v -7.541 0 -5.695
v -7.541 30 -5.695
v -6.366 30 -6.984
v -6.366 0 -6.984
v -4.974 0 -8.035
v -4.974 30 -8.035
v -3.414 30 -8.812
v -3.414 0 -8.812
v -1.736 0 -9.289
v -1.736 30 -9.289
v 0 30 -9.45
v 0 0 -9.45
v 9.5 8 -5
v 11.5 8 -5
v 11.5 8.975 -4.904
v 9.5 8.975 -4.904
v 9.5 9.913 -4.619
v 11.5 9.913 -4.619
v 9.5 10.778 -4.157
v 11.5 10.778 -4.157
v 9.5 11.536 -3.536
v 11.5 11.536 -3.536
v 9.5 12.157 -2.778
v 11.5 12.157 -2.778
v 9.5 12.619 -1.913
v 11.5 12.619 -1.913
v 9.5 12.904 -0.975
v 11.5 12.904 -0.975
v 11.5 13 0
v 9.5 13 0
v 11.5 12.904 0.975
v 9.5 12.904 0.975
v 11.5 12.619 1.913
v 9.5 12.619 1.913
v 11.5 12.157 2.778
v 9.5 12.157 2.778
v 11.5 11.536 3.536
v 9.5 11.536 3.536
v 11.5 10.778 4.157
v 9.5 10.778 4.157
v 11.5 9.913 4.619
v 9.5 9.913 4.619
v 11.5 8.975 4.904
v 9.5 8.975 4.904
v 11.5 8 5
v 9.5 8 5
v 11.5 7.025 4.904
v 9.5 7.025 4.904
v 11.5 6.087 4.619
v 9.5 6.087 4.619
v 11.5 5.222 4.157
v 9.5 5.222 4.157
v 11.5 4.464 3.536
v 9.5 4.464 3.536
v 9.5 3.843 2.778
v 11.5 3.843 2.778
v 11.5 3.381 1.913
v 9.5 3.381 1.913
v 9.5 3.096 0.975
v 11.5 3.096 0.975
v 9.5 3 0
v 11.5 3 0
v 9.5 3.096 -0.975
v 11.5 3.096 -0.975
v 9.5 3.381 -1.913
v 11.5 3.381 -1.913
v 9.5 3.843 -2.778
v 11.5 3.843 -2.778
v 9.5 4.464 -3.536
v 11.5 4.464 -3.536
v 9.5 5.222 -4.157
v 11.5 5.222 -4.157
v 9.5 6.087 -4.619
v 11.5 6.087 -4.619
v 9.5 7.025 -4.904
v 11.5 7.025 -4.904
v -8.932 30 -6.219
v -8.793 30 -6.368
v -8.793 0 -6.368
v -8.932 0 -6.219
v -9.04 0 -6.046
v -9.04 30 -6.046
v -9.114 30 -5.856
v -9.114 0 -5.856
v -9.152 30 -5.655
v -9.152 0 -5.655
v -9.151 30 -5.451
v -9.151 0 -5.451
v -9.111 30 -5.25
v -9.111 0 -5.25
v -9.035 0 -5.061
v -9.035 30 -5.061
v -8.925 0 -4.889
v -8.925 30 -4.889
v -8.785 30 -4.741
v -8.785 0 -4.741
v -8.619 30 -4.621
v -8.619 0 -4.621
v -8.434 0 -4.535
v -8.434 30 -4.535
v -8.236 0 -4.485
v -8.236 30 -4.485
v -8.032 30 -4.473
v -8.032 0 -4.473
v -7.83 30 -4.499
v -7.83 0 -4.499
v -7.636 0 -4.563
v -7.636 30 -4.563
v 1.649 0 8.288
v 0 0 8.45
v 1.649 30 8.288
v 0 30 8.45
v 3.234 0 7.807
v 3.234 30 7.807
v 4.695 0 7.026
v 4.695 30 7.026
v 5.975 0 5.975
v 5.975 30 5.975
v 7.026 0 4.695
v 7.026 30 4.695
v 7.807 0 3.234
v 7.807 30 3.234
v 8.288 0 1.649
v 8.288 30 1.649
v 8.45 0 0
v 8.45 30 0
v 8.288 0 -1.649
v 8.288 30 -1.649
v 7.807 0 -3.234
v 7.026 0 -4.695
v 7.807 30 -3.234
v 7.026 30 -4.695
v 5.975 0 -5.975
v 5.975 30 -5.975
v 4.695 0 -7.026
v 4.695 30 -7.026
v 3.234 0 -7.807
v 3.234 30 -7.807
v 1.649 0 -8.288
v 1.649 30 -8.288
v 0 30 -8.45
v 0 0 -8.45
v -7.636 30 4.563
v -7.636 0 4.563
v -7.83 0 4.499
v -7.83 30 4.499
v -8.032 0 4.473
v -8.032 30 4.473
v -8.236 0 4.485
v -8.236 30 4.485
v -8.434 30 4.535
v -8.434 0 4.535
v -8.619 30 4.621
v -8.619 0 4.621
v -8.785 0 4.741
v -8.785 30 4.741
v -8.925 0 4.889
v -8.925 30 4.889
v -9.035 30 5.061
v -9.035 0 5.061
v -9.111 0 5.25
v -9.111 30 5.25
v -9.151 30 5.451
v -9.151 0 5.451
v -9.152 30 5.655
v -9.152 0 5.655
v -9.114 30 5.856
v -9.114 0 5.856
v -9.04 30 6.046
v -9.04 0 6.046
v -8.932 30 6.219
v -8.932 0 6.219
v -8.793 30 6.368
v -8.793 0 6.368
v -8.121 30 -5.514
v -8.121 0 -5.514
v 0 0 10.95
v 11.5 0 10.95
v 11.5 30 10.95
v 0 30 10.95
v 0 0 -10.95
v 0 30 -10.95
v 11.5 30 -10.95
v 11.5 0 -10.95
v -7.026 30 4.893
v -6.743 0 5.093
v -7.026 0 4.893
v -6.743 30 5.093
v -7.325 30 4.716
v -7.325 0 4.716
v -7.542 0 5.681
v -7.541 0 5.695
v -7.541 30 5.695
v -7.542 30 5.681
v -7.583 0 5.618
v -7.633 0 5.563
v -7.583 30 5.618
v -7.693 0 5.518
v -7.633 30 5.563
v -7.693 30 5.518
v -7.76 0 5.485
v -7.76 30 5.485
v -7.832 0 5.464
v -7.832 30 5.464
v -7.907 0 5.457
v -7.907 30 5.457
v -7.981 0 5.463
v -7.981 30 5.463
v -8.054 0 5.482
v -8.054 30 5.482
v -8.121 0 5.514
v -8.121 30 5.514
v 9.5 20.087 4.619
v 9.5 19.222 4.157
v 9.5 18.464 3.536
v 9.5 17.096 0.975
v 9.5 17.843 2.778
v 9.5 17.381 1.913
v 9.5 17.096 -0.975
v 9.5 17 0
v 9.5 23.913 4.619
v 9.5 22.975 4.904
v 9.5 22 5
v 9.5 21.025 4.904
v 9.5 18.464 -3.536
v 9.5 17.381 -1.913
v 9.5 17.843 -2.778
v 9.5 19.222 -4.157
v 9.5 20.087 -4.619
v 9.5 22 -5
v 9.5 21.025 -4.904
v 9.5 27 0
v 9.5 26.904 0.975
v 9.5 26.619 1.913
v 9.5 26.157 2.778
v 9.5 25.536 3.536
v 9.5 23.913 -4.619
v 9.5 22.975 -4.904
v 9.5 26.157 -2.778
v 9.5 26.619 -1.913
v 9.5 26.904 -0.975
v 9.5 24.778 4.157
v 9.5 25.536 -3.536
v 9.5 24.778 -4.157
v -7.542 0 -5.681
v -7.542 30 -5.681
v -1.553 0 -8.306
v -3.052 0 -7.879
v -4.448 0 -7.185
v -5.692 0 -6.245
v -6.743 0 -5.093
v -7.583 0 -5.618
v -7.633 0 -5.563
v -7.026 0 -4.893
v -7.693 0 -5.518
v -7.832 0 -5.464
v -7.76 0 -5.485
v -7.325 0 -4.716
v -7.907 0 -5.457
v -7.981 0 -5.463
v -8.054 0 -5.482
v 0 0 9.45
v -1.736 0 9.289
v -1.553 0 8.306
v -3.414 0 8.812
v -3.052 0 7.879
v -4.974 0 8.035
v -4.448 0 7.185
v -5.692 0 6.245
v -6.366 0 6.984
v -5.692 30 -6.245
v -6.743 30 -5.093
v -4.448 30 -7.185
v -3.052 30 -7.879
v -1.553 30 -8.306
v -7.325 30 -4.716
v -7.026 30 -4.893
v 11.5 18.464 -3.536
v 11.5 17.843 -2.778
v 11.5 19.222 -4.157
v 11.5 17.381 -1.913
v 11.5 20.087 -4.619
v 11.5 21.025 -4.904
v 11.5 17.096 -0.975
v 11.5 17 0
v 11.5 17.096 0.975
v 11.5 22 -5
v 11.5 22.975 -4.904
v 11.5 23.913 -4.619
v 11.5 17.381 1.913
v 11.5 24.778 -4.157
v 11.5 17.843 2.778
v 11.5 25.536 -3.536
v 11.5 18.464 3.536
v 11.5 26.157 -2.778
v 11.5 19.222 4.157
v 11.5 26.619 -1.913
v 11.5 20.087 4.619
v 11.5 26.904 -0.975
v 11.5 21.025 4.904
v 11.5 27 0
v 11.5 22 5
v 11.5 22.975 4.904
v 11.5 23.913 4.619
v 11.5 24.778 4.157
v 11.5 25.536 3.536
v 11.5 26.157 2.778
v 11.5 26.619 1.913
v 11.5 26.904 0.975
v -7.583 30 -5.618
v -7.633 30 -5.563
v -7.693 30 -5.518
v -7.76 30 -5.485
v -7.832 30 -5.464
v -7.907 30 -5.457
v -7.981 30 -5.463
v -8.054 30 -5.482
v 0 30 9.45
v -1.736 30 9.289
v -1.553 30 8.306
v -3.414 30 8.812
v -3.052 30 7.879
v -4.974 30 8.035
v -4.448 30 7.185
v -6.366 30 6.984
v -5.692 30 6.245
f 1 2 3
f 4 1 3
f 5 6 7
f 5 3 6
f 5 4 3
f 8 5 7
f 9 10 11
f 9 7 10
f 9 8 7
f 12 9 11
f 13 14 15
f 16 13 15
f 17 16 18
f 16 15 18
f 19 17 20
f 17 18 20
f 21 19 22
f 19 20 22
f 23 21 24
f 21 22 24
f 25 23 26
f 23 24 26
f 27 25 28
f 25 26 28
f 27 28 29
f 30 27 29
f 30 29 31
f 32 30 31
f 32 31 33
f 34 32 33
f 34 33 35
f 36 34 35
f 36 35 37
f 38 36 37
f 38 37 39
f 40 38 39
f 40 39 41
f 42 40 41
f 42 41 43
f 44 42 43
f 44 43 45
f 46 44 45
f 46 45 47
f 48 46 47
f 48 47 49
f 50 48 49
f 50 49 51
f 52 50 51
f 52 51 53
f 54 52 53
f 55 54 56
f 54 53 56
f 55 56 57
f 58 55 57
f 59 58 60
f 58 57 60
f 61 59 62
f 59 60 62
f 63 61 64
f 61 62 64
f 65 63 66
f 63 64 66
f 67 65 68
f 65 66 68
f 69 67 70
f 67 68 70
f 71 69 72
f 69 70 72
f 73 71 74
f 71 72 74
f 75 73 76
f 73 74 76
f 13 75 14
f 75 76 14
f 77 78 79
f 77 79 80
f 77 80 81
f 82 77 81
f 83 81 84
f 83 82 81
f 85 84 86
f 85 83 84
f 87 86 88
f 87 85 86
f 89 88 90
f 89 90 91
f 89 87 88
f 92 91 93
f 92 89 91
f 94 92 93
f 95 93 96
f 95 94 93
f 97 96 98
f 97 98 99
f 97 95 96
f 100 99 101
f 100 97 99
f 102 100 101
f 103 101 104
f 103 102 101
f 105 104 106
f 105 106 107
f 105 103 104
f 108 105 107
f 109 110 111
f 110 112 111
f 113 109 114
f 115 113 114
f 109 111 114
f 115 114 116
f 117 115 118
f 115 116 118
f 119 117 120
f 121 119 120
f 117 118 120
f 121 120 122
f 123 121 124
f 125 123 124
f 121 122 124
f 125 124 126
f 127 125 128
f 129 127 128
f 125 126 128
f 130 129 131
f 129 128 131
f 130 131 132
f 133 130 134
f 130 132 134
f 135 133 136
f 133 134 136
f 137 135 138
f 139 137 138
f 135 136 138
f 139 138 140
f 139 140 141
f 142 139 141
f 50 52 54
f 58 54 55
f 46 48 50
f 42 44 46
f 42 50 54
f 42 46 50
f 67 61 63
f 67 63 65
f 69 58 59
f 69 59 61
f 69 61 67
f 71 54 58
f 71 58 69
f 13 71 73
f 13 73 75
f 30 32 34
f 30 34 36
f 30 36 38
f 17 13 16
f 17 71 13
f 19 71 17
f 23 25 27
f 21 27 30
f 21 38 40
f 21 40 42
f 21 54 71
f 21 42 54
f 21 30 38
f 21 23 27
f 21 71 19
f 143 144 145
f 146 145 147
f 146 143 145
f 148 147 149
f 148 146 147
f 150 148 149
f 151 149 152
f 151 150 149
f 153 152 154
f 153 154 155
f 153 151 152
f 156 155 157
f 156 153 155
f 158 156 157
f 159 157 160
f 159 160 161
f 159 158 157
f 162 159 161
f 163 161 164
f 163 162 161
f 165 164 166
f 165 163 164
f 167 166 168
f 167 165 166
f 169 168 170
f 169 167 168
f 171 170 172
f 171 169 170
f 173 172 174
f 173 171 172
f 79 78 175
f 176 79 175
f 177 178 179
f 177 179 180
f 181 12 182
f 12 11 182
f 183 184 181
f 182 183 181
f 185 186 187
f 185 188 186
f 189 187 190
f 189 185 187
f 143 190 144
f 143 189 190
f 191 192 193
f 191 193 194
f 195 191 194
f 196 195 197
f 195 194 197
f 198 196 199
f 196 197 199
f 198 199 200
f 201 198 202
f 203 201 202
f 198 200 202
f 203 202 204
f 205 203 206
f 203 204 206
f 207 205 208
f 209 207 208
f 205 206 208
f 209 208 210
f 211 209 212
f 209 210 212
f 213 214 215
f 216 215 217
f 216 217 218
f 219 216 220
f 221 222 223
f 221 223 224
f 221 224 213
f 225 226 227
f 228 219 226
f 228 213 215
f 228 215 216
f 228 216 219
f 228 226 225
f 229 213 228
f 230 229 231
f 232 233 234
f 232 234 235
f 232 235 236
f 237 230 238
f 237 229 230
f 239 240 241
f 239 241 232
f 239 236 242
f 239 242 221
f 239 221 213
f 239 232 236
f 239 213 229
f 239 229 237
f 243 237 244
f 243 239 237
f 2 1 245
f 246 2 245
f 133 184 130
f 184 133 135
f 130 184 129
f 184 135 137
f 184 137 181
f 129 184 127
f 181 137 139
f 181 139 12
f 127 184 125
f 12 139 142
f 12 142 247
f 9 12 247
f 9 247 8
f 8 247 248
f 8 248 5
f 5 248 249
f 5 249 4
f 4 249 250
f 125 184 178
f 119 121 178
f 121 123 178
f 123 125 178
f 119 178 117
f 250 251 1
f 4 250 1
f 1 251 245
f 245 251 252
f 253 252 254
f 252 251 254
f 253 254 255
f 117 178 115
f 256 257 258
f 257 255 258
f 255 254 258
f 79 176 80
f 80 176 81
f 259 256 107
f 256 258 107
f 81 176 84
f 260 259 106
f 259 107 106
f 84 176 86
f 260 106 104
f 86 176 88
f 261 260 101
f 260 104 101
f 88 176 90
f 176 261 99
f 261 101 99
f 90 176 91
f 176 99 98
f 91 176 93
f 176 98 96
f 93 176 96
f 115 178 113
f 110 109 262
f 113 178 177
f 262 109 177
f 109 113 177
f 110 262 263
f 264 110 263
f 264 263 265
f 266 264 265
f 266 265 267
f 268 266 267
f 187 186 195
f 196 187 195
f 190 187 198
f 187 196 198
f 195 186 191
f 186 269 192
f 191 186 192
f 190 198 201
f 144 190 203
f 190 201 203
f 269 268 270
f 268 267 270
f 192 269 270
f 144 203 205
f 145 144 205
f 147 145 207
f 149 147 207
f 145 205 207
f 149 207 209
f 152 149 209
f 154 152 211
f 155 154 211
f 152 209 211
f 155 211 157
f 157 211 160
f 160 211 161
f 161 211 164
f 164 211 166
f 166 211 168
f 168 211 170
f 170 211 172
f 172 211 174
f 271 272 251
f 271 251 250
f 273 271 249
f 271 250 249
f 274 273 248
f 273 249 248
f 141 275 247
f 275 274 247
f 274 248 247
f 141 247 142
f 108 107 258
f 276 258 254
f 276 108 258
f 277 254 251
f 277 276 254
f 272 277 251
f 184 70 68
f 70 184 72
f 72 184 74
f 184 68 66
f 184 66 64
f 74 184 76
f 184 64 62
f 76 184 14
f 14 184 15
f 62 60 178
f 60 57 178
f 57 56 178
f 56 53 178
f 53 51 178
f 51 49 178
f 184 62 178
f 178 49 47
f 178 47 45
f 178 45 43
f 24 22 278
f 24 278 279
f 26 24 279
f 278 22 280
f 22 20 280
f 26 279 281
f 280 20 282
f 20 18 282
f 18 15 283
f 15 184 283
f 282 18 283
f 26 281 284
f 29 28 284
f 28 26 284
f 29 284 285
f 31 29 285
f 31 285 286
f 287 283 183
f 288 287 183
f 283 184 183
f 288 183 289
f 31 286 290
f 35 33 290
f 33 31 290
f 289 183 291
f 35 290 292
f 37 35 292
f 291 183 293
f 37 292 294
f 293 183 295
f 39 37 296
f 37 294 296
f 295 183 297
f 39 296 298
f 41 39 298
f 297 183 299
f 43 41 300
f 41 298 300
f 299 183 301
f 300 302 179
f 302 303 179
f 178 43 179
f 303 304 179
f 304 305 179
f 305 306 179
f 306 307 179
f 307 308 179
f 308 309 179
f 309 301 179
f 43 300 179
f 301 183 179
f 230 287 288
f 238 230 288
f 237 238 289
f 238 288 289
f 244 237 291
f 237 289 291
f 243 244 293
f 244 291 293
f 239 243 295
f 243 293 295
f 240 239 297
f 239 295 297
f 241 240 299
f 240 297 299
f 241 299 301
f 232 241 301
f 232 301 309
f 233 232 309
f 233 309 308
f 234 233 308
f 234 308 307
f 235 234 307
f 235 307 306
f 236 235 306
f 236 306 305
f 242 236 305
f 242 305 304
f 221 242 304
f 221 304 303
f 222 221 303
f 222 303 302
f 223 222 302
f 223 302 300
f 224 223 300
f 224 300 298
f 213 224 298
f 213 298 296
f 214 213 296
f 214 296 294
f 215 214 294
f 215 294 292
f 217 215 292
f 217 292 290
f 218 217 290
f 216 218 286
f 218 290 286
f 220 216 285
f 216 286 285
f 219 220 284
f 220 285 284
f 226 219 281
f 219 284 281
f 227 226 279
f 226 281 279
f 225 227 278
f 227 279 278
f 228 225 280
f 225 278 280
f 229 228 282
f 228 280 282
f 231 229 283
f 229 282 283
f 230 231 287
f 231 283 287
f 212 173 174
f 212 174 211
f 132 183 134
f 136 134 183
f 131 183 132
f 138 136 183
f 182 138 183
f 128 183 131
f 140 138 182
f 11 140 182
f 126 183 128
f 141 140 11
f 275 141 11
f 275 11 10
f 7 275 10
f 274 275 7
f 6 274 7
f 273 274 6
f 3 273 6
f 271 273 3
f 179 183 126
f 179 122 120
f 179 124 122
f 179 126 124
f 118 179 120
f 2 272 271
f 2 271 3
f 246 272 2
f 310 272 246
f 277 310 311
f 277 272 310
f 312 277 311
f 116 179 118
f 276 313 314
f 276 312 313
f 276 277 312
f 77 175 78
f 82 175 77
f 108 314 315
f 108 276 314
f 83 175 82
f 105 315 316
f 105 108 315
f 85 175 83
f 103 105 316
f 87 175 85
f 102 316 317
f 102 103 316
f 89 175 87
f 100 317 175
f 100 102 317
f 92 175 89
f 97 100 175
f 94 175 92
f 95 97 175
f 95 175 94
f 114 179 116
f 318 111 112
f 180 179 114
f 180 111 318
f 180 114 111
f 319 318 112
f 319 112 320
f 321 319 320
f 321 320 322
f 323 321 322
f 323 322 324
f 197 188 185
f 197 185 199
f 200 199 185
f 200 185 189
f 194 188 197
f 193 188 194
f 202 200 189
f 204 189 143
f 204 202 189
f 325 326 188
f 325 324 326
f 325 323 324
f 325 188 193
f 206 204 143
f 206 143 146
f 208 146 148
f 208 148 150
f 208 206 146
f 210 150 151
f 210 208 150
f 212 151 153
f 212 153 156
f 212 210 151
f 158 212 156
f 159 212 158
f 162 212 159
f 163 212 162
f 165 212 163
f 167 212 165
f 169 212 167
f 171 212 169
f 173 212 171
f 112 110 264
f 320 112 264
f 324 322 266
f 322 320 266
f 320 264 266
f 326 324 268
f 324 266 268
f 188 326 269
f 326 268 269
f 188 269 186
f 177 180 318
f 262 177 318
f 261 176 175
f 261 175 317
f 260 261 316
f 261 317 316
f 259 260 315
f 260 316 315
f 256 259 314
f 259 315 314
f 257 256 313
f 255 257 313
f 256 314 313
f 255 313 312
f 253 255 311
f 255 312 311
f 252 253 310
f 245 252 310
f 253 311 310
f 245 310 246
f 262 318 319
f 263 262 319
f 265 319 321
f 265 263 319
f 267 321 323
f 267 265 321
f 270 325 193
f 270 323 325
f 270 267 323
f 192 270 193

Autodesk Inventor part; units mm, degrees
ref_plane "YZ Plane" through (0, 0, 0) normal (1, 0, 0) x (0, 1, 0)
ref_plane "XZ Plane" through (0, 0, 0) normal (0, 1, 0) x (-1, 0, 0)
ref_plane "XY Plane" through (0, 0, 0) normal (0, 0, 1) x (1, 0, 0)
sketch "Эскиз1" plane through (0, 0, 0) normal (0, 1, 0) x (-1, 0, 0)
  circle A0 centre (0, 0) radius 8.45
  circle A1 centre (0, 0) radius 9.45
  line L0 (0, 0) -> (7.5409, 5.6954)
  line L1 (0, 0) -> (7.5409, -5.6954)
  point P0 (6.7429, -5.0927)
  point P1 (6.7429, 5.0927)
  dimension "d0" = 16.9
  dimension "d1" = 18.9
extrude "Выдавливание1" add sketch "Эскиз1" along normal blind 30 contours A0 L1 A1 L0 picked at (6.7284, 6.0563)
sketch "Эскиз2" plane through (0, 30, 0) normal (0, 1, 0) x (1, 0, 0)
  arc A0 (-6.7429, -5.0927) -> (-7.6356, -4.5628) centre (-9.4442, -8.6266) ccw
  arc A1 (-7.6356, -4.5628) -> (-8.7926, -6.3685) centre (-8.07, -5.558) ccw
  line L0 (-8.7926, -6.3685) -> (-8.1213, -5.5141)
  arc A2 (-7.5423, -5.6808) -> (-8.1213, -5.5141) centre (-7.9107, -5.8712) ccw
  line L1 (-6.7429, -5.0927) -> (-7.5409, -5.6954)
  line L2 (-7.5409, -5.6954) -> (-6.7429, -5.0927)
  line L3 (-7.5409, -5.6954) -> (-7.5423, -5.6808)
  line L4 (-0.0151, 0) -> (-3.489, 0)
  arc A3 (-7.6356, 4.5628) -> (-6.7429, 5.0927) centre (-9.4442, 8.6266) ccw
  arc A4 (-8.1213, 5.5141) -> (-7.5423, 5.6808) centre (-7.9107, 5.8712) ccw
  line L5 (-6.7429, 5.0927) -> (-7.5409, 5.6954)
  line L6 (-7.5409, 5.6954) -> (-6.7429, 5.0927)
  line L7 (-7.5409, 5.6954) -> (-7.5423, 5.6808)
  arc A5 (-8.7926, 6.3685) -> (-7.6356, 4.5628) centre (-8.07, 5.558) ccw
  line L8 (-8.7926, 6.3685) -> (-8.1213, 5.5141)
  point P0 (-6.7429, 5.0927)
  point P1 (-5.3694, -4.0591)
  point P2 (-7.5409, 5.6954)
  point P3 (-5.3694, 4.0591)
  point P4 (-7.5409, 5.6954)
  dimension "d25" = 1.0859
sketch "Эскиз3" plane through (0, 30, 0) normal (0, 1, 0) x (1, 0, 0)
  arc A0 (-7.5409, -5.6954) -> (-7.5409, 5.6954) centre (0, 0) ccw projected
  line L0 (11.5, -6.95) -> (11.5, 6.95)
  arc A1 (-6.7429, -5.0927) -> (-6.7429, 5.0927) centre (0, 0) ccw projected
  arc A2 (0, -8.45) -> (0, 8.45) centre (0, 0) ccw
  line L1 (0, -9.45) -> (0, -8.45)
  line L2 (0, 8.45) -> (0, 9.45)
  line L3 (11.5, 6.95) -> (11.5, 10.95)
  line L4 (11.5, -6.95) -> (11.5, -10.95)
  line L5 (0, 4.95) -> (0, 9.45)
  line L6 (11.5, -10.95) -> (0, -10.95)
  line L7 (0, -10.95) -> (0, -9.45)
  line L8 (11.5, 10.95) -> (0, 10.95)
  line L9 (0, 10.95) -> (0, 9.45)
  point P0 (0, 8.45)
  dimension "d13" = 4
  dimension "d14" = 4
  dimension "d22" = 21.9
  dimension "d23" = 2.5
extrude "Выдавливание3" add sketch "Эскиз3" against normal blind 30
ref_plane "РабПлоскость1" through (11.5, 20, 4.95) normal (1, 0, 0) x (0, 0, -1)
sketch "Эскиз4" plane through (11.5, 20, 4.95) normal (1, 0, 0) x (0, 0, -1)
  line L0 (4.95, -20) -> (4.95, 10)
  line L1 (1, 10) -> (8.9, 10) projected
  circle A0 centre (4.95, -12) radius 5
  line L2 (14.4, -20) -> (-4.5, -20) projected
  circle A1 centre (4.95, 2) radius 5
  line L3 (-4.5, 10) -> (14.4, 10) projected
  point P0 (7.3306, 10)
  point P1 (2.5694, 10)
  point P2 (4.95, 10)
  dimension "d15" = 10
  dimension "d16" = 8
  dimension "d17" = 10
  dimension "d18" = 8
extrude "Выдавливание4" cut sketch "Эскиз4" against normal blind 2
extrude "Выдавливание5" add sketch "Эскиз2" against normal blind 30
properties part number "крепление маркера 17мм"
